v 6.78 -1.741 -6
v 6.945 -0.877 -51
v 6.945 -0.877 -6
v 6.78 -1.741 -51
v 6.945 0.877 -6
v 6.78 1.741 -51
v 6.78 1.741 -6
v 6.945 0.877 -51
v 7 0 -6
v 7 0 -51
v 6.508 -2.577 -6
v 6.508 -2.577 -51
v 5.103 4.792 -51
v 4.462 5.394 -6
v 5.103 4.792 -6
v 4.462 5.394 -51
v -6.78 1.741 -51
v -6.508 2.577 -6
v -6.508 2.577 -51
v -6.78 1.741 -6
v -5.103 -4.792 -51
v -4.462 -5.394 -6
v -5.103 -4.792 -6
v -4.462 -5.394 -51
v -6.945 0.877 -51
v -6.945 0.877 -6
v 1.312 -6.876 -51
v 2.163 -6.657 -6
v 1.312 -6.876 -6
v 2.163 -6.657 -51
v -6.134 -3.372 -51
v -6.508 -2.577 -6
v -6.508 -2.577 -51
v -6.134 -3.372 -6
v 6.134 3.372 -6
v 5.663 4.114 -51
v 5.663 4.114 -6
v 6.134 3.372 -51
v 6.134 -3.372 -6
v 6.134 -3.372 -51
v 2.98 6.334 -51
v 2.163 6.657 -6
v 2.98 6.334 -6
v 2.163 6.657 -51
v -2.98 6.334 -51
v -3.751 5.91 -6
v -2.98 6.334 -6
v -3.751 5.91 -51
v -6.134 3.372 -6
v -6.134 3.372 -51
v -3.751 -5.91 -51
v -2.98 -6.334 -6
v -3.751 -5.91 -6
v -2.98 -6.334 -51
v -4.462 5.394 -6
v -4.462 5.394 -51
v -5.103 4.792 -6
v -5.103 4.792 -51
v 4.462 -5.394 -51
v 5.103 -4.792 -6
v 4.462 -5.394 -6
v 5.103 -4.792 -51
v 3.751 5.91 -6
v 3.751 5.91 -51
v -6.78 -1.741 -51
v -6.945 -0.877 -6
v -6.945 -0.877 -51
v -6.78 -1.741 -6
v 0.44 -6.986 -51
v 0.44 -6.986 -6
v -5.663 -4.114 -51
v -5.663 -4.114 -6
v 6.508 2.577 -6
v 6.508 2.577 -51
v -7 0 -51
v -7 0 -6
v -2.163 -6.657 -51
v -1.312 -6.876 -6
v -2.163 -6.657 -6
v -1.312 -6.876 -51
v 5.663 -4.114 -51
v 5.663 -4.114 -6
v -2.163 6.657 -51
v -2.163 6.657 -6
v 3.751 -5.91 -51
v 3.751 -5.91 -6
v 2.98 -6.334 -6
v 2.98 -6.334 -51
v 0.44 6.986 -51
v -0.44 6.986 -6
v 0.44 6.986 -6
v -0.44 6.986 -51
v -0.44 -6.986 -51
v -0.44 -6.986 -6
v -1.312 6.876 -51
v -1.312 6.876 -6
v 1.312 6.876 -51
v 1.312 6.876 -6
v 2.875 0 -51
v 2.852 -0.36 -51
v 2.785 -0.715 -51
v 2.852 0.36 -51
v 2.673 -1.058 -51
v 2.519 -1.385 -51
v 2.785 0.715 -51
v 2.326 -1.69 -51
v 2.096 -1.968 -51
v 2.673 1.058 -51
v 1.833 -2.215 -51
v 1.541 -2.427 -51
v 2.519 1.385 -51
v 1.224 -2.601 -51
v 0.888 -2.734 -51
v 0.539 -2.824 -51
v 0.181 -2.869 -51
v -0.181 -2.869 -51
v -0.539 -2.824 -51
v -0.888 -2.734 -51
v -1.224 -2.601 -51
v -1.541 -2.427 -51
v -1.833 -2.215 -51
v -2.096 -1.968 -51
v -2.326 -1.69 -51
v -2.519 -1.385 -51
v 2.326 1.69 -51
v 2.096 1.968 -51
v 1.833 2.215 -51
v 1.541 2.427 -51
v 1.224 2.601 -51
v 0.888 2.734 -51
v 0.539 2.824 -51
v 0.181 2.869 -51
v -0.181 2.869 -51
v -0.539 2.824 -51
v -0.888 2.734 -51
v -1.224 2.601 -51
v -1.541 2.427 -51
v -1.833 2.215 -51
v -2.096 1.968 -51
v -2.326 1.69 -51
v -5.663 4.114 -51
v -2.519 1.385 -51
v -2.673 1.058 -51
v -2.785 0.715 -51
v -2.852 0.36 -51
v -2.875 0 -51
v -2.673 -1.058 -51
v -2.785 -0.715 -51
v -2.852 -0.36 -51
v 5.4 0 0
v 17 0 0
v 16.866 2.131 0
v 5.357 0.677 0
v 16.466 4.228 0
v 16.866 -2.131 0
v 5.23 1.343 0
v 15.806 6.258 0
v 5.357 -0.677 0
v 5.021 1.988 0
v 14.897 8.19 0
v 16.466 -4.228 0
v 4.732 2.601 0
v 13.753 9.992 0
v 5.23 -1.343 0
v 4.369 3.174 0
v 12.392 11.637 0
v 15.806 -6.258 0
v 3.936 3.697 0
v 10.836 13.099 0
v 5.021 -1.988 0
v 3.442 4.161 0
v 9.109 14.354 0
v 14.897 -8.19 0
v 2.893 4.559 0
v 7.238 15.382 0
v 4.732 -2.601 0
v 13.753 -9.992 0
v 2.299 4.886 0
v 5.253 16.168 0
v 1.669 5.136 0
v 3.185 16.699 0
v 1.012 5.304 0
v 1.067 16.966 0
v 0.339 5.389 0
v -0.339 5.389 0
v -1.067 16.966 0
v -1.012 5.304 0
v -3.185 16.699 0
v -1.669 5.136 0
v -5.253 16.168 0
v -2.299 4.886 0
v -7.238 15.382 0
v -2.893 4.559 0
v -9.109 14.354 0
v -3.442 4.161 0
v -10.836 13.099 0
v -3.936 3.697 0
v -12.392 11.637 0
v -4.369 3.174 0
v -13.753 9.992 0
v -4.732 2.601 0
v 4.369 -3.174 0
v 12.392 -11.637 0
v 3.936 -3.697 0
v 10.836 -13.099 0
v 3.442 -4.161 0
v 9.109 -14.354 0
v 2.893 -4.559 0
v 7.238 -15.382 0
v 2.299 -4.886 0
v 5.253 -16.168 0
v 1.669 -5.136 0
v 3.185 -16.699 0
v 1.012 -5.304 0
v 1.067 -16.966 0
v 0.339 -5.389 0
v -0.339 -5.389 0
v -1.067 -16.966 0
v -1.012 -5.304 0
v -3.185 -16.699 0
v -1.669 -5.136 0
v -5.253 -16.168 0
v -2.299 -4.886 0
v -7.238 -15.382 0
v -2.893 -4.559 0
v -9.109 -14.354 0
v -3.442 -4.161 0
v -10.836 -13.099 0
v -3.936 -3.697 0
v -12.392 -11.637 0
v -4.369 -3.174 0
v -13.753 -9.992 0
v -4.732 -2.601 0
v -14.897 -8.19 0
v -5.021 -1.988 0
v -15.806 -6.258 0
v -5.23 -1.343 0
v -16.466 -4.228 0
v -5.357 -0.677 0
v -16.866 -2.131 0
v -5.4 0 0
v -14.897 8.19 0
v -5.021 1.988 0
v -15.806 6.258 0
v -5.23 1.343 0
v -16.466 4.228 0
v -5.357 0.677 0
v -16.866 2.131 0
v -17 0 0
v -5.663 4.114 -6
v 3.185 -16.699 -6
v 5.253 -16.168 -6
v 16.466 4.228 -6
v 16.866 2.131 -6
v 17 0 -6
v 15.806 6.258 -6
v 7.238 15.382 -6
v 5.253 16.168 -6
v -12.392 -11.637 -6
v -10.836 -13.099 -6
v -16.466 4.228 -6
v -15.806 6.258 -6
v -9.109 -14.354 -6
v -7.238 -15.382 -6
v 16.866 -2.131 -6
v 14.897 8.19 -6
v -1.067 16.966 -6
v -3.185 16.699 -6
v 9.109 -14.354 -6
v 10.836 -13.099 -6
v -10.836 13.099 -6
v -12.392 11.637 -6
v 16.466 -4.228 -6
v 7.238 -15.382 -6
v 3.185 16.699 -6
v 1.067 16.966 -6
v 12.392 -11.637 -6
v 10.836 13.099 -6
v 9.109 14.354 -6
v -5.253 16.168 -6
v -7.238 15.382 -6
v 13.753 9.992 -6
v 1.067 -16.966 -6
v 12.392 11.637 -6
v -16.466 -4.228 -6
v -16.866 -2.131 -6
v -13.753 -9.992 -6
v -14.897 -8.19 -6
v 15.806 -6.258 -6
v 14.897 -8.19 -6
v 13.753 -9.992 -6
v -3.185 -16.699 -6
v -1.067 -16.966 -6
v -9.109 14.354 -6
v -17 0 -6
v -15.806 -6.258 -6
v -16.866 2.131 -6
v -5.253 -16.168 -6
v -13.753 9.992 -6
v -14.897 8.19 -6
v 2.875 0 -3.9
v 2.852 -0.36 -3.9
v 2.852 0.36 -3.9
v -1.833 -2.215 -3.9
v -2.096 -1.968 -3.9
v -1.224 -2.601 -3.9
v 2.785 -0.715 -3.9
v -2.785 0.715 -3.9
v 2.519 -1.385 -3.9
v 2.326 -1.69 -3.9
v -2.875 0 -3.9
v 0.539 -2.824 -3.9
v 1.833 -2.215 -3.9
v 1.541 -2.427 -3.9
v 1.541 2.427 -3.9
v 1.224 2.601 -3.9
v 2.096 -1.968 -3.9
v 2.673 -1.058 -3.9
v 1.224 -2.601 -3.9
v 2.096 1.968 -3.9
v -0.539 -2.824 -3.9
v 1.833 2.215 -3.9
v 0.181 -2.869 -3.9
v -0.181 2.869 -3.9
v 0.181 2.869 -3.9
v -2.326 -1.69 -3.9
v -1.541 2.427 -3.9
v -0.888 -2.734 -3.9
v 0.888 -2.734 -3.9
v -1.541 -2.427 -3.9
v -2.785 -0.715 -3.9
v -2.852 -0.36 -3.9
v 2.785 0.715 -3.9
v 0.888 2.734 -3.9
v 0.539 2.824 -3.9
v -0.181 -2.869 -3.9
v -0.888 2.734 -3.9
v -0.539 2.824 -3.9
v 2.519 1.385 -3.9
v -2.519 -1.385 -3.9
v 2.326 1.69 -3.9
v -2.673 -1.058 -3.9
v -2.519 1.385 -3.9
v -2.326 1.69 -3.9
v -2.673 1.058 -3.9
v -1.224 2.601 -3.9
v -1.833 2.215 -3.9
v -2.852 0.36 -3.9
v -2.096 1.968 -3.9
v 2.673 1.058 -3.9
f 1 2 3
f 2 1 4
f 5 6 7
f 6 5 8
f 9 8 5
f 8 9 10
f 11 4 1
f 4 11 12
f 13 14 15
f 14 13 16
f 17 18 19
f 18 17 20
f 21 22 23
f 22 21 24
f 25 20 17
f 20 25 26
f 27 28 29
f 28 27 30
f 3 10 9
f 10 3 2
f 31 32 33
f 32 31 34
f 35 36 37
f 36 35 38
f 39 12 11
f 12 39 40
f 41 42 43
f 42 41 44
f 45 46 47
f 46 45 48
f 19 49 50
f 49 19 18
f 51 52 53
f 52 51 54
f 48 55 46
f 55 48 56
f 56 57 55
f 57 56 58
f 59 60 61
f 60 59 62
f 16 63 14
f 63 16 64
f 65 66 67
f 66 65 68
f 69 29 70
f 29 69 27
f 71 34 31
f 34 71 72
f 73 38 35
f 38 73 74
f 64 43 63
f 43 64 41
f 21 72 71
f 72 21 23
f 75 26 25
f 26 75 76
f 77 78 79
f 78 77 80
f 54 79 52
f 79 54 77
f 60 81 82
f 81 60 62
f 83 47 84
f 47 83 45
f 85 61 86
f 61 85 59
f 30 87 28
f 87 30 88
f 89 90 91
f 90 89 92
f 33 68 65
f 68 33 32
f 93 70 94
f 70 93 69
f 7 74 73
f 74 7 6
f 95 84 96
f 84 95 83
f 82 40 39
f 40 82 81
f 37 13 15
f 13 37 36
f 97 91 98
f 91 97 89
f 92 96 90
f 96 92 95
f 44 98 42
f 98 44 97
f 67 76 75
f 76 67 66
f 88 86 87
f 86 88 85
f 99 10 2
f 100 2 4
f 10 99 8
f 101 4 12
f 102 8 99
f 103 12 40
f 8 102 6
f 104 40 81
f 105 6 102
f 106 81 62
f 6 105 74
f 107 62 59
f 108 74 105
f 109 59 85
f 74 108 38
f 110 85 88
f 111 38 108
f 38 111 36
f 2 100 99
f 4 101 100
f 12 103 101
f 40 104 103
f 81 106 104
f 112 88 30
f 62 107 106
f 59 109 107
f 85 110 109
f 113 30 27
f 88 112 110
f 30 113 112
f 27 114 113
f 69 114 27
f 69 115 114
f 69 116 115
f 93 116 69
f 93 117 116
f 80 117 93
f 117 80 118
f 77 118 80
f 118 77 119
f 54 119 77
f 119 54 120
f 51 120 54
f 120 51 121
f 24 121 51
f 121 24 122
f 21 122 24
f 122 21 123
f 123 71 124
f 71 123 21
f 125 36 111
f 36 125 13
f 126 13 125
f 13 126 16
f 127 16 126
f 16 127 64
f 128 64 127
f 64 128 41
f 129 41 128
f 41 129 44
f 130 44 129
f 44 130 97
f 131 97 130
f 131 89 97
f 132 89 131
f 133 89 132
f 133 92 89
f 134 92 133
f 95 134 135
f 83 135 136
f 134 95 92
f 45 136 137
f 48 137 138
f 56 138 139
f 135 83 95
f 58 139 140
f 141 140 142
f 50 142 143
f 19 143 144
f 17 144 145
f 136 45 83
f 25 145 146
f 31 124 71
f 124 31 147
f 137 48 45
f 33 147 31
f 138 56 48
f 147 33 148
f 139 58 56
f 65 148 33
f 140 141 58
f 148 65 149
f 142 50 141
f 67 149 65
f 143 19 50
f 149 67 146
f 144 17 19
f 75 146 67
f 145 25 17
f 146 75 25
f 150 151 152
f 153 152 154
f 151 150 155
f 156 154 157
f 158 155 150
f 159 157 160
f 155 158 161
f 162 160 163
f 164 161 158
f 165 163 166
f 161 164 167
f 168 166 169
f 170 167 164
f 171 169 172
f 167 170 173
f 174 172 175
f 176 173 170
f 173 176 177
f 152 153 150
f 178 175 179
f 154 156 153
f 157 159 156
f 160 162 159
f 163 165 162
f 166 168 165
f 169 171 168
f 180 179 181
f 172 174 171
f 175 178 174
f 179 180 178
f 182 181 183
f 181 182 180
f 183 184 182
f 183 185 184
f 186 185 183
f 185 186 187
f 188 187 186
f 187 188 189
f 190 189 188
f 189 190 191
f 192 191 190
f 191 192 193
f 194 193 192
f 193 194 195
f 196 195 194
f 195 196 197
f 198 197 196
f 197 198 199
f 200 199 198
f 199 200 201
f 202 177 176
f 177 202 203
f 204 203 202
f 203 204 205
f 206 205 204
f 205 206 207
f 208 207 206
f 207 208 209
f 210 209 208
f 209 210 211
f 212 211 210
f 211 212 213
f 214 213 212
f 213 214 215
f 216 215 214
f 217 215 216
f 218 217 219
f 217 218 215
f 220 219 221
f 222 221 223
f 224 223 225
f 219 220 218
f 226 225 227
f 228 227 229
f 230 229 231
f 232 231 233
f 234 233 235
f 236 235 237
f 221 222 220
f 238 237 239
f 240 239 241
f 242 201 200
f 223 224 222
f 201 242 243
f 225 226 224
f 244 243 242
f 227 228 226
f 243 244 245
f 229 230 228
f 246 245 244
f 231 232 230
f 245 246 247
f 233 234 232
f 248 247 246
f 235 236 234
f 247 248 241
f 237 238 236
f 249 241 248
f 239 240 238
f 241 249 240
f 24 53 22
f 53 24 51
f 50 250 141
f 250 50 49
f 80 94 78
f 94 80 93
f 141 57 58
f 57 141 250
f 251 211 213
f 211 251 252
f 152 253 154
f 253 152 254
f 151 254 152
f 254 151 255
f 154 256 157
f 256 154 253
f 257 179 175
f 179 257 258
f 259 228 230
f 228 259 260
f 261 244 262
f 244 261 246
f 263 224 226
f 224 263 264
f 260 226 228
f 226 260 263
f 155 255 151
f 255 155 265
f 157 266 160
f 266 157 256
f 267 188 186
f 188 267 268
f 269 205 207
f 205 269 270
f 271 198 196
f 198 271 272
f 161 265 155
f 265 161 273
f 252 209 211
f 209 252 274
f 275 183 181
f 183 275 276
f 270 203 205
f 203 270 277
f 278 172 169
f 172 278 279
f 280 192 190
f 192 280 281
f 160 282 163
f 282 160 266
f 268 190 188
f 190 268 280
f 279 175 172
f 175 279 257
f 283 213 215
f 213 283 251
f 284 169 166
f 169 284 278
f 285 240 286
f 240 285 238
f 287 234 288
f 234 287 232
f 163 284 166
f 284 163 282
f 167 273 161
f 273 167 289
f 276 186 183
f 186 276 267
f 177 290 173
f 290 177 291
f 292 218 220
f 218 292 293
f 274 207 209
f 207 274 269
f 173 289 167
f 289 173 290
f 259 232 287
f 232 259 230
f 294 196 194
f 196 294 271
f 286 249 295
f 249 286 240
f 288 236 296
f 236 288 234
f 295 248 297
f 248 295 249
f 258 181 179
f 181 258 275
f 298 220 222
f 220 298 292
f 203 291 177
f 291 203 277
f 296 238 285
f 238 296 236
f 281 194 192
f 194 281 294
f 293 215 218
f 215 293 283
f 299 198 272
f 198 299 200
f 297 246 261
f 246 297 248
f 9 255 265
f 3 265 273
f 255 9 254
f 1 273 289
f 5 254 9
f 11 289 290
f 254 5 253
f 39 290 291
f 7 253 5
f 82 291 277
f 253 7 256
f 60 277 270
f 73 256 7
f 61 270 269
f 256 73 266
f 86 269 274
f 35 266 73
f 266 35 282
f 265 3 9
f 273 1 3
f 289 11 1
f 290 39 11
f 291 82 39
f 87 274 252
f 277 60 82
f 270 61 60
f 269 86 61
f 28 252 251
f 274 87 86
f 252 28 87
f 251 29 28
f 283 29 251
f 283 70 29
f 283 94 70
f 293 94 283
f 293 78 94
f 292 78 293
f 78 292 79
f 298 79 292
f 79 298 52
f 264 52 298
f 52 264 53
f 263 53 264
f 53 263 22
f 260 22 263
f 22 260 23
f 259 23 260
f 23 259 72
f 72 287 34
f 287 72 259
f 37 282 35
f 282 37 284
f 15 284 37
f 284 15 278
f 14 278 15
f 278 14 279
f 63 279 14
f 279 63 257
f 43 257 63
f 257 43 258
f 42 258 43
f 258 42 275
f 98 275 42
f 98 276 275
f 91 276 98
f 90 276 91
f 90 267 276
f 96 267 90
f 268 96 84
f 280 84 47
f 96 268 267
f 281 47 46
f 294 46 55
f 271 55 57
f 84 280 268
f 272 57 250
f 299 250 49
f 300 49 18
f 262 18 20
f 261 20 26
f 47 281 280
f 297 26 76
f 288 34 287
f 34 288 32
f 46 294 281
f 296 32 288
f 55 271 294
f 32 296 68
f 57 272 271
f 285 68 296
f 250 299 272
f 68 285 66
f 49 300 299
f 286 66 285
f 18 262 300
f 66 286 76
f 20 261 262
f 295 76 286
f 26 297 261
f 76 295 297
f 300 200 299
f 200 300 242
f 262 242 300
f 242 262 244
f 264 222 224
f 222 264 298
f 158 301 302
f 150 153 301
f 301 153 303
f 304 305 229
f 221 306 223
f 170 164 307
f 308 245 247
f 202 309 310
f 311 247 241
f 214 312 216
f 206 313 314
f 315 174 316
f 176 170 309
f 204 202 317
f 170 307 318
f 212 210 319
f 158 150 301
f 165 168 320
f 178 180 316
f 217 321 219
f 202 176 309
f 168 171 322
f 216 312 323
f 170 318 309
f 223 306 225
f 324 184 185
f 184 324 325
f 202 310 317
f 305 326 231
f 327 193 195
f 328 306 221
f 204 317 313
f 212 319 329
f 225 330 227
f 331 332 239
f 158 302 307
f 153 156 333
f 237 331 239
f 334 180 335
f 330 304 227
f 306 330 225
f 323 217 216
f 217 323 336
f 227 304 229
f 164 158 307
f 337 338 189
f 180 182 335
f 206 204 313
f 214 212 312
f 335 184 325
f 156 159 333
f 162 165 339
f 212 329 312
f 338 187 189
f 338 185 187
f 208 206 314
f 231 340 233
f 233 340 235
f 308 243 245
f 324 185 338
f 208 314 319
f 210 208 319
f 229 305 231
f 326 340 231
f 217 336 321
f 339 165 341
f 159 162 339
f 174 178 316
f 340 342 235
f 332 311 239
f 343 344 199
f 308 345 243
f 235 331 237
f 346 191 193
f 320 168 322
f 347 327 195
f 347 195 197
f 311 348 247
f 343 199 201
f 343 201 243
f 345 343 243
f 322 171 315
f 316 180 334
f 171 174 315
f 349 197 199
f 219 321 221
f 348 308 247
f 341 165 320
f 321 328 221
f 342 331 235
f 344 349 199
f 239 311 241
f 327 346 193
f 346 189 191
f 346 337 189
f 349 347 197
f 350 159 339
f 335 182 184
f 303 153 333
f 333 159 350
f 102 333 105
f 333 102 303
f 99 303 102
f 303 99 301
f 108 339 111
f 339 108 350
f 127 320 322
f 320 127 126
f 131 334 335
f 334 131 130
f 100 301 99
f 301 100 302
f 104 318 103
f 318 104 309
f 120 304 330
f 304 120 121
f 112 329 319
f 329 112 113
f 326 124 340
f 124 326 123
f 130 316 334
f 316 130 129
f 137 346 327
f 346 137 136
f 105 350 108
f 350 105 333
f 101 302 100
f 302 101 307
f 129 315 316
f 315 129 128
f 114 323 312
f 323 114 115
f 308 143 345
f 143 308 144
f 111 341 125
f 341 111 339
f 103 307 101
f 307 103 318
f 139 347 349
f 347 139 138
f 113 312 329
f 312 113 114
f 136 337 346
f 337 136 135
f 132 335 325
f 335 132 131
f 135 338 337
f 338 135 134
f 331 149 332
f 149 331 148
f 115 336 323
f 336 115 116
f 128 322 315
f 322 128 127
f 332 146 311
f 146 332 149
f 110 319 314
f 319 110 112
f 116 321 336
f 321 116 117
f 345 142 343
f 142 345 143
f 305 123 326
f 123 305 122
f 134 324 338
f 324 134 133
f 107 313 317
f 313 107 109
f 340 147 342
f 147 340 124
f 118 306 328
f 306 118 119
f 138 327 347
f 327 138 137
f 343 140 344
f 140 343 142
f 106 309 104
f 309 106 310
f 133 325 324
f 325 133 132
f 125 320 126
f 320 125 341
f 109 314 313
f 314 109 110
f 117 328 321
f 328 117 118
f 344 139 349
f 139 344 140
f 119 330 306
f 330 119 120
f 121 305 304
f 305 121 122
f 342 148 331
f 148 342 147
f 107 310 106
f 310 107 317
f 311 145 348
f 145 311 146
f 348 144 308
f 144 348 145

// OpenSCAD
$fn = 50;


difference() {
	union() {
		translate(v = [0, 0, -51.0000000000]) {
			cylinder(h = 51, r = 7.0000000000);
		}
		translate(v = [0, 0, -6.0000000000]) {
			cylinder(h = 6, r = 17.0000000000);
		}
	}
	union() {
		translate(v = [0, 0, 0]) {
			rotate(a = [0, 0, 0]) {
				difference() {
					union() {
						#translate(v = [0, 0, -51.0000000000]) {
							cylinder(h = 51, r = 2.6000000000);
						}
						#translate(v = [0, 0, -3.9000000000]) {
							cylinder(h = 3.9000000000, r1 = 2.8750000000, r2 = 5.4000000000);
						}
						#translate(v = [0, 0, -51.0000000000]) {
							cylinder(h = 51, r = 2.8750000000);
						}
						#translate(v = [0, 0, -51.0000000000]) {
							cylinder(h = 51, r = 2.6000000000);
						}
					}
					union();
				}
			}
		}
	}
}
